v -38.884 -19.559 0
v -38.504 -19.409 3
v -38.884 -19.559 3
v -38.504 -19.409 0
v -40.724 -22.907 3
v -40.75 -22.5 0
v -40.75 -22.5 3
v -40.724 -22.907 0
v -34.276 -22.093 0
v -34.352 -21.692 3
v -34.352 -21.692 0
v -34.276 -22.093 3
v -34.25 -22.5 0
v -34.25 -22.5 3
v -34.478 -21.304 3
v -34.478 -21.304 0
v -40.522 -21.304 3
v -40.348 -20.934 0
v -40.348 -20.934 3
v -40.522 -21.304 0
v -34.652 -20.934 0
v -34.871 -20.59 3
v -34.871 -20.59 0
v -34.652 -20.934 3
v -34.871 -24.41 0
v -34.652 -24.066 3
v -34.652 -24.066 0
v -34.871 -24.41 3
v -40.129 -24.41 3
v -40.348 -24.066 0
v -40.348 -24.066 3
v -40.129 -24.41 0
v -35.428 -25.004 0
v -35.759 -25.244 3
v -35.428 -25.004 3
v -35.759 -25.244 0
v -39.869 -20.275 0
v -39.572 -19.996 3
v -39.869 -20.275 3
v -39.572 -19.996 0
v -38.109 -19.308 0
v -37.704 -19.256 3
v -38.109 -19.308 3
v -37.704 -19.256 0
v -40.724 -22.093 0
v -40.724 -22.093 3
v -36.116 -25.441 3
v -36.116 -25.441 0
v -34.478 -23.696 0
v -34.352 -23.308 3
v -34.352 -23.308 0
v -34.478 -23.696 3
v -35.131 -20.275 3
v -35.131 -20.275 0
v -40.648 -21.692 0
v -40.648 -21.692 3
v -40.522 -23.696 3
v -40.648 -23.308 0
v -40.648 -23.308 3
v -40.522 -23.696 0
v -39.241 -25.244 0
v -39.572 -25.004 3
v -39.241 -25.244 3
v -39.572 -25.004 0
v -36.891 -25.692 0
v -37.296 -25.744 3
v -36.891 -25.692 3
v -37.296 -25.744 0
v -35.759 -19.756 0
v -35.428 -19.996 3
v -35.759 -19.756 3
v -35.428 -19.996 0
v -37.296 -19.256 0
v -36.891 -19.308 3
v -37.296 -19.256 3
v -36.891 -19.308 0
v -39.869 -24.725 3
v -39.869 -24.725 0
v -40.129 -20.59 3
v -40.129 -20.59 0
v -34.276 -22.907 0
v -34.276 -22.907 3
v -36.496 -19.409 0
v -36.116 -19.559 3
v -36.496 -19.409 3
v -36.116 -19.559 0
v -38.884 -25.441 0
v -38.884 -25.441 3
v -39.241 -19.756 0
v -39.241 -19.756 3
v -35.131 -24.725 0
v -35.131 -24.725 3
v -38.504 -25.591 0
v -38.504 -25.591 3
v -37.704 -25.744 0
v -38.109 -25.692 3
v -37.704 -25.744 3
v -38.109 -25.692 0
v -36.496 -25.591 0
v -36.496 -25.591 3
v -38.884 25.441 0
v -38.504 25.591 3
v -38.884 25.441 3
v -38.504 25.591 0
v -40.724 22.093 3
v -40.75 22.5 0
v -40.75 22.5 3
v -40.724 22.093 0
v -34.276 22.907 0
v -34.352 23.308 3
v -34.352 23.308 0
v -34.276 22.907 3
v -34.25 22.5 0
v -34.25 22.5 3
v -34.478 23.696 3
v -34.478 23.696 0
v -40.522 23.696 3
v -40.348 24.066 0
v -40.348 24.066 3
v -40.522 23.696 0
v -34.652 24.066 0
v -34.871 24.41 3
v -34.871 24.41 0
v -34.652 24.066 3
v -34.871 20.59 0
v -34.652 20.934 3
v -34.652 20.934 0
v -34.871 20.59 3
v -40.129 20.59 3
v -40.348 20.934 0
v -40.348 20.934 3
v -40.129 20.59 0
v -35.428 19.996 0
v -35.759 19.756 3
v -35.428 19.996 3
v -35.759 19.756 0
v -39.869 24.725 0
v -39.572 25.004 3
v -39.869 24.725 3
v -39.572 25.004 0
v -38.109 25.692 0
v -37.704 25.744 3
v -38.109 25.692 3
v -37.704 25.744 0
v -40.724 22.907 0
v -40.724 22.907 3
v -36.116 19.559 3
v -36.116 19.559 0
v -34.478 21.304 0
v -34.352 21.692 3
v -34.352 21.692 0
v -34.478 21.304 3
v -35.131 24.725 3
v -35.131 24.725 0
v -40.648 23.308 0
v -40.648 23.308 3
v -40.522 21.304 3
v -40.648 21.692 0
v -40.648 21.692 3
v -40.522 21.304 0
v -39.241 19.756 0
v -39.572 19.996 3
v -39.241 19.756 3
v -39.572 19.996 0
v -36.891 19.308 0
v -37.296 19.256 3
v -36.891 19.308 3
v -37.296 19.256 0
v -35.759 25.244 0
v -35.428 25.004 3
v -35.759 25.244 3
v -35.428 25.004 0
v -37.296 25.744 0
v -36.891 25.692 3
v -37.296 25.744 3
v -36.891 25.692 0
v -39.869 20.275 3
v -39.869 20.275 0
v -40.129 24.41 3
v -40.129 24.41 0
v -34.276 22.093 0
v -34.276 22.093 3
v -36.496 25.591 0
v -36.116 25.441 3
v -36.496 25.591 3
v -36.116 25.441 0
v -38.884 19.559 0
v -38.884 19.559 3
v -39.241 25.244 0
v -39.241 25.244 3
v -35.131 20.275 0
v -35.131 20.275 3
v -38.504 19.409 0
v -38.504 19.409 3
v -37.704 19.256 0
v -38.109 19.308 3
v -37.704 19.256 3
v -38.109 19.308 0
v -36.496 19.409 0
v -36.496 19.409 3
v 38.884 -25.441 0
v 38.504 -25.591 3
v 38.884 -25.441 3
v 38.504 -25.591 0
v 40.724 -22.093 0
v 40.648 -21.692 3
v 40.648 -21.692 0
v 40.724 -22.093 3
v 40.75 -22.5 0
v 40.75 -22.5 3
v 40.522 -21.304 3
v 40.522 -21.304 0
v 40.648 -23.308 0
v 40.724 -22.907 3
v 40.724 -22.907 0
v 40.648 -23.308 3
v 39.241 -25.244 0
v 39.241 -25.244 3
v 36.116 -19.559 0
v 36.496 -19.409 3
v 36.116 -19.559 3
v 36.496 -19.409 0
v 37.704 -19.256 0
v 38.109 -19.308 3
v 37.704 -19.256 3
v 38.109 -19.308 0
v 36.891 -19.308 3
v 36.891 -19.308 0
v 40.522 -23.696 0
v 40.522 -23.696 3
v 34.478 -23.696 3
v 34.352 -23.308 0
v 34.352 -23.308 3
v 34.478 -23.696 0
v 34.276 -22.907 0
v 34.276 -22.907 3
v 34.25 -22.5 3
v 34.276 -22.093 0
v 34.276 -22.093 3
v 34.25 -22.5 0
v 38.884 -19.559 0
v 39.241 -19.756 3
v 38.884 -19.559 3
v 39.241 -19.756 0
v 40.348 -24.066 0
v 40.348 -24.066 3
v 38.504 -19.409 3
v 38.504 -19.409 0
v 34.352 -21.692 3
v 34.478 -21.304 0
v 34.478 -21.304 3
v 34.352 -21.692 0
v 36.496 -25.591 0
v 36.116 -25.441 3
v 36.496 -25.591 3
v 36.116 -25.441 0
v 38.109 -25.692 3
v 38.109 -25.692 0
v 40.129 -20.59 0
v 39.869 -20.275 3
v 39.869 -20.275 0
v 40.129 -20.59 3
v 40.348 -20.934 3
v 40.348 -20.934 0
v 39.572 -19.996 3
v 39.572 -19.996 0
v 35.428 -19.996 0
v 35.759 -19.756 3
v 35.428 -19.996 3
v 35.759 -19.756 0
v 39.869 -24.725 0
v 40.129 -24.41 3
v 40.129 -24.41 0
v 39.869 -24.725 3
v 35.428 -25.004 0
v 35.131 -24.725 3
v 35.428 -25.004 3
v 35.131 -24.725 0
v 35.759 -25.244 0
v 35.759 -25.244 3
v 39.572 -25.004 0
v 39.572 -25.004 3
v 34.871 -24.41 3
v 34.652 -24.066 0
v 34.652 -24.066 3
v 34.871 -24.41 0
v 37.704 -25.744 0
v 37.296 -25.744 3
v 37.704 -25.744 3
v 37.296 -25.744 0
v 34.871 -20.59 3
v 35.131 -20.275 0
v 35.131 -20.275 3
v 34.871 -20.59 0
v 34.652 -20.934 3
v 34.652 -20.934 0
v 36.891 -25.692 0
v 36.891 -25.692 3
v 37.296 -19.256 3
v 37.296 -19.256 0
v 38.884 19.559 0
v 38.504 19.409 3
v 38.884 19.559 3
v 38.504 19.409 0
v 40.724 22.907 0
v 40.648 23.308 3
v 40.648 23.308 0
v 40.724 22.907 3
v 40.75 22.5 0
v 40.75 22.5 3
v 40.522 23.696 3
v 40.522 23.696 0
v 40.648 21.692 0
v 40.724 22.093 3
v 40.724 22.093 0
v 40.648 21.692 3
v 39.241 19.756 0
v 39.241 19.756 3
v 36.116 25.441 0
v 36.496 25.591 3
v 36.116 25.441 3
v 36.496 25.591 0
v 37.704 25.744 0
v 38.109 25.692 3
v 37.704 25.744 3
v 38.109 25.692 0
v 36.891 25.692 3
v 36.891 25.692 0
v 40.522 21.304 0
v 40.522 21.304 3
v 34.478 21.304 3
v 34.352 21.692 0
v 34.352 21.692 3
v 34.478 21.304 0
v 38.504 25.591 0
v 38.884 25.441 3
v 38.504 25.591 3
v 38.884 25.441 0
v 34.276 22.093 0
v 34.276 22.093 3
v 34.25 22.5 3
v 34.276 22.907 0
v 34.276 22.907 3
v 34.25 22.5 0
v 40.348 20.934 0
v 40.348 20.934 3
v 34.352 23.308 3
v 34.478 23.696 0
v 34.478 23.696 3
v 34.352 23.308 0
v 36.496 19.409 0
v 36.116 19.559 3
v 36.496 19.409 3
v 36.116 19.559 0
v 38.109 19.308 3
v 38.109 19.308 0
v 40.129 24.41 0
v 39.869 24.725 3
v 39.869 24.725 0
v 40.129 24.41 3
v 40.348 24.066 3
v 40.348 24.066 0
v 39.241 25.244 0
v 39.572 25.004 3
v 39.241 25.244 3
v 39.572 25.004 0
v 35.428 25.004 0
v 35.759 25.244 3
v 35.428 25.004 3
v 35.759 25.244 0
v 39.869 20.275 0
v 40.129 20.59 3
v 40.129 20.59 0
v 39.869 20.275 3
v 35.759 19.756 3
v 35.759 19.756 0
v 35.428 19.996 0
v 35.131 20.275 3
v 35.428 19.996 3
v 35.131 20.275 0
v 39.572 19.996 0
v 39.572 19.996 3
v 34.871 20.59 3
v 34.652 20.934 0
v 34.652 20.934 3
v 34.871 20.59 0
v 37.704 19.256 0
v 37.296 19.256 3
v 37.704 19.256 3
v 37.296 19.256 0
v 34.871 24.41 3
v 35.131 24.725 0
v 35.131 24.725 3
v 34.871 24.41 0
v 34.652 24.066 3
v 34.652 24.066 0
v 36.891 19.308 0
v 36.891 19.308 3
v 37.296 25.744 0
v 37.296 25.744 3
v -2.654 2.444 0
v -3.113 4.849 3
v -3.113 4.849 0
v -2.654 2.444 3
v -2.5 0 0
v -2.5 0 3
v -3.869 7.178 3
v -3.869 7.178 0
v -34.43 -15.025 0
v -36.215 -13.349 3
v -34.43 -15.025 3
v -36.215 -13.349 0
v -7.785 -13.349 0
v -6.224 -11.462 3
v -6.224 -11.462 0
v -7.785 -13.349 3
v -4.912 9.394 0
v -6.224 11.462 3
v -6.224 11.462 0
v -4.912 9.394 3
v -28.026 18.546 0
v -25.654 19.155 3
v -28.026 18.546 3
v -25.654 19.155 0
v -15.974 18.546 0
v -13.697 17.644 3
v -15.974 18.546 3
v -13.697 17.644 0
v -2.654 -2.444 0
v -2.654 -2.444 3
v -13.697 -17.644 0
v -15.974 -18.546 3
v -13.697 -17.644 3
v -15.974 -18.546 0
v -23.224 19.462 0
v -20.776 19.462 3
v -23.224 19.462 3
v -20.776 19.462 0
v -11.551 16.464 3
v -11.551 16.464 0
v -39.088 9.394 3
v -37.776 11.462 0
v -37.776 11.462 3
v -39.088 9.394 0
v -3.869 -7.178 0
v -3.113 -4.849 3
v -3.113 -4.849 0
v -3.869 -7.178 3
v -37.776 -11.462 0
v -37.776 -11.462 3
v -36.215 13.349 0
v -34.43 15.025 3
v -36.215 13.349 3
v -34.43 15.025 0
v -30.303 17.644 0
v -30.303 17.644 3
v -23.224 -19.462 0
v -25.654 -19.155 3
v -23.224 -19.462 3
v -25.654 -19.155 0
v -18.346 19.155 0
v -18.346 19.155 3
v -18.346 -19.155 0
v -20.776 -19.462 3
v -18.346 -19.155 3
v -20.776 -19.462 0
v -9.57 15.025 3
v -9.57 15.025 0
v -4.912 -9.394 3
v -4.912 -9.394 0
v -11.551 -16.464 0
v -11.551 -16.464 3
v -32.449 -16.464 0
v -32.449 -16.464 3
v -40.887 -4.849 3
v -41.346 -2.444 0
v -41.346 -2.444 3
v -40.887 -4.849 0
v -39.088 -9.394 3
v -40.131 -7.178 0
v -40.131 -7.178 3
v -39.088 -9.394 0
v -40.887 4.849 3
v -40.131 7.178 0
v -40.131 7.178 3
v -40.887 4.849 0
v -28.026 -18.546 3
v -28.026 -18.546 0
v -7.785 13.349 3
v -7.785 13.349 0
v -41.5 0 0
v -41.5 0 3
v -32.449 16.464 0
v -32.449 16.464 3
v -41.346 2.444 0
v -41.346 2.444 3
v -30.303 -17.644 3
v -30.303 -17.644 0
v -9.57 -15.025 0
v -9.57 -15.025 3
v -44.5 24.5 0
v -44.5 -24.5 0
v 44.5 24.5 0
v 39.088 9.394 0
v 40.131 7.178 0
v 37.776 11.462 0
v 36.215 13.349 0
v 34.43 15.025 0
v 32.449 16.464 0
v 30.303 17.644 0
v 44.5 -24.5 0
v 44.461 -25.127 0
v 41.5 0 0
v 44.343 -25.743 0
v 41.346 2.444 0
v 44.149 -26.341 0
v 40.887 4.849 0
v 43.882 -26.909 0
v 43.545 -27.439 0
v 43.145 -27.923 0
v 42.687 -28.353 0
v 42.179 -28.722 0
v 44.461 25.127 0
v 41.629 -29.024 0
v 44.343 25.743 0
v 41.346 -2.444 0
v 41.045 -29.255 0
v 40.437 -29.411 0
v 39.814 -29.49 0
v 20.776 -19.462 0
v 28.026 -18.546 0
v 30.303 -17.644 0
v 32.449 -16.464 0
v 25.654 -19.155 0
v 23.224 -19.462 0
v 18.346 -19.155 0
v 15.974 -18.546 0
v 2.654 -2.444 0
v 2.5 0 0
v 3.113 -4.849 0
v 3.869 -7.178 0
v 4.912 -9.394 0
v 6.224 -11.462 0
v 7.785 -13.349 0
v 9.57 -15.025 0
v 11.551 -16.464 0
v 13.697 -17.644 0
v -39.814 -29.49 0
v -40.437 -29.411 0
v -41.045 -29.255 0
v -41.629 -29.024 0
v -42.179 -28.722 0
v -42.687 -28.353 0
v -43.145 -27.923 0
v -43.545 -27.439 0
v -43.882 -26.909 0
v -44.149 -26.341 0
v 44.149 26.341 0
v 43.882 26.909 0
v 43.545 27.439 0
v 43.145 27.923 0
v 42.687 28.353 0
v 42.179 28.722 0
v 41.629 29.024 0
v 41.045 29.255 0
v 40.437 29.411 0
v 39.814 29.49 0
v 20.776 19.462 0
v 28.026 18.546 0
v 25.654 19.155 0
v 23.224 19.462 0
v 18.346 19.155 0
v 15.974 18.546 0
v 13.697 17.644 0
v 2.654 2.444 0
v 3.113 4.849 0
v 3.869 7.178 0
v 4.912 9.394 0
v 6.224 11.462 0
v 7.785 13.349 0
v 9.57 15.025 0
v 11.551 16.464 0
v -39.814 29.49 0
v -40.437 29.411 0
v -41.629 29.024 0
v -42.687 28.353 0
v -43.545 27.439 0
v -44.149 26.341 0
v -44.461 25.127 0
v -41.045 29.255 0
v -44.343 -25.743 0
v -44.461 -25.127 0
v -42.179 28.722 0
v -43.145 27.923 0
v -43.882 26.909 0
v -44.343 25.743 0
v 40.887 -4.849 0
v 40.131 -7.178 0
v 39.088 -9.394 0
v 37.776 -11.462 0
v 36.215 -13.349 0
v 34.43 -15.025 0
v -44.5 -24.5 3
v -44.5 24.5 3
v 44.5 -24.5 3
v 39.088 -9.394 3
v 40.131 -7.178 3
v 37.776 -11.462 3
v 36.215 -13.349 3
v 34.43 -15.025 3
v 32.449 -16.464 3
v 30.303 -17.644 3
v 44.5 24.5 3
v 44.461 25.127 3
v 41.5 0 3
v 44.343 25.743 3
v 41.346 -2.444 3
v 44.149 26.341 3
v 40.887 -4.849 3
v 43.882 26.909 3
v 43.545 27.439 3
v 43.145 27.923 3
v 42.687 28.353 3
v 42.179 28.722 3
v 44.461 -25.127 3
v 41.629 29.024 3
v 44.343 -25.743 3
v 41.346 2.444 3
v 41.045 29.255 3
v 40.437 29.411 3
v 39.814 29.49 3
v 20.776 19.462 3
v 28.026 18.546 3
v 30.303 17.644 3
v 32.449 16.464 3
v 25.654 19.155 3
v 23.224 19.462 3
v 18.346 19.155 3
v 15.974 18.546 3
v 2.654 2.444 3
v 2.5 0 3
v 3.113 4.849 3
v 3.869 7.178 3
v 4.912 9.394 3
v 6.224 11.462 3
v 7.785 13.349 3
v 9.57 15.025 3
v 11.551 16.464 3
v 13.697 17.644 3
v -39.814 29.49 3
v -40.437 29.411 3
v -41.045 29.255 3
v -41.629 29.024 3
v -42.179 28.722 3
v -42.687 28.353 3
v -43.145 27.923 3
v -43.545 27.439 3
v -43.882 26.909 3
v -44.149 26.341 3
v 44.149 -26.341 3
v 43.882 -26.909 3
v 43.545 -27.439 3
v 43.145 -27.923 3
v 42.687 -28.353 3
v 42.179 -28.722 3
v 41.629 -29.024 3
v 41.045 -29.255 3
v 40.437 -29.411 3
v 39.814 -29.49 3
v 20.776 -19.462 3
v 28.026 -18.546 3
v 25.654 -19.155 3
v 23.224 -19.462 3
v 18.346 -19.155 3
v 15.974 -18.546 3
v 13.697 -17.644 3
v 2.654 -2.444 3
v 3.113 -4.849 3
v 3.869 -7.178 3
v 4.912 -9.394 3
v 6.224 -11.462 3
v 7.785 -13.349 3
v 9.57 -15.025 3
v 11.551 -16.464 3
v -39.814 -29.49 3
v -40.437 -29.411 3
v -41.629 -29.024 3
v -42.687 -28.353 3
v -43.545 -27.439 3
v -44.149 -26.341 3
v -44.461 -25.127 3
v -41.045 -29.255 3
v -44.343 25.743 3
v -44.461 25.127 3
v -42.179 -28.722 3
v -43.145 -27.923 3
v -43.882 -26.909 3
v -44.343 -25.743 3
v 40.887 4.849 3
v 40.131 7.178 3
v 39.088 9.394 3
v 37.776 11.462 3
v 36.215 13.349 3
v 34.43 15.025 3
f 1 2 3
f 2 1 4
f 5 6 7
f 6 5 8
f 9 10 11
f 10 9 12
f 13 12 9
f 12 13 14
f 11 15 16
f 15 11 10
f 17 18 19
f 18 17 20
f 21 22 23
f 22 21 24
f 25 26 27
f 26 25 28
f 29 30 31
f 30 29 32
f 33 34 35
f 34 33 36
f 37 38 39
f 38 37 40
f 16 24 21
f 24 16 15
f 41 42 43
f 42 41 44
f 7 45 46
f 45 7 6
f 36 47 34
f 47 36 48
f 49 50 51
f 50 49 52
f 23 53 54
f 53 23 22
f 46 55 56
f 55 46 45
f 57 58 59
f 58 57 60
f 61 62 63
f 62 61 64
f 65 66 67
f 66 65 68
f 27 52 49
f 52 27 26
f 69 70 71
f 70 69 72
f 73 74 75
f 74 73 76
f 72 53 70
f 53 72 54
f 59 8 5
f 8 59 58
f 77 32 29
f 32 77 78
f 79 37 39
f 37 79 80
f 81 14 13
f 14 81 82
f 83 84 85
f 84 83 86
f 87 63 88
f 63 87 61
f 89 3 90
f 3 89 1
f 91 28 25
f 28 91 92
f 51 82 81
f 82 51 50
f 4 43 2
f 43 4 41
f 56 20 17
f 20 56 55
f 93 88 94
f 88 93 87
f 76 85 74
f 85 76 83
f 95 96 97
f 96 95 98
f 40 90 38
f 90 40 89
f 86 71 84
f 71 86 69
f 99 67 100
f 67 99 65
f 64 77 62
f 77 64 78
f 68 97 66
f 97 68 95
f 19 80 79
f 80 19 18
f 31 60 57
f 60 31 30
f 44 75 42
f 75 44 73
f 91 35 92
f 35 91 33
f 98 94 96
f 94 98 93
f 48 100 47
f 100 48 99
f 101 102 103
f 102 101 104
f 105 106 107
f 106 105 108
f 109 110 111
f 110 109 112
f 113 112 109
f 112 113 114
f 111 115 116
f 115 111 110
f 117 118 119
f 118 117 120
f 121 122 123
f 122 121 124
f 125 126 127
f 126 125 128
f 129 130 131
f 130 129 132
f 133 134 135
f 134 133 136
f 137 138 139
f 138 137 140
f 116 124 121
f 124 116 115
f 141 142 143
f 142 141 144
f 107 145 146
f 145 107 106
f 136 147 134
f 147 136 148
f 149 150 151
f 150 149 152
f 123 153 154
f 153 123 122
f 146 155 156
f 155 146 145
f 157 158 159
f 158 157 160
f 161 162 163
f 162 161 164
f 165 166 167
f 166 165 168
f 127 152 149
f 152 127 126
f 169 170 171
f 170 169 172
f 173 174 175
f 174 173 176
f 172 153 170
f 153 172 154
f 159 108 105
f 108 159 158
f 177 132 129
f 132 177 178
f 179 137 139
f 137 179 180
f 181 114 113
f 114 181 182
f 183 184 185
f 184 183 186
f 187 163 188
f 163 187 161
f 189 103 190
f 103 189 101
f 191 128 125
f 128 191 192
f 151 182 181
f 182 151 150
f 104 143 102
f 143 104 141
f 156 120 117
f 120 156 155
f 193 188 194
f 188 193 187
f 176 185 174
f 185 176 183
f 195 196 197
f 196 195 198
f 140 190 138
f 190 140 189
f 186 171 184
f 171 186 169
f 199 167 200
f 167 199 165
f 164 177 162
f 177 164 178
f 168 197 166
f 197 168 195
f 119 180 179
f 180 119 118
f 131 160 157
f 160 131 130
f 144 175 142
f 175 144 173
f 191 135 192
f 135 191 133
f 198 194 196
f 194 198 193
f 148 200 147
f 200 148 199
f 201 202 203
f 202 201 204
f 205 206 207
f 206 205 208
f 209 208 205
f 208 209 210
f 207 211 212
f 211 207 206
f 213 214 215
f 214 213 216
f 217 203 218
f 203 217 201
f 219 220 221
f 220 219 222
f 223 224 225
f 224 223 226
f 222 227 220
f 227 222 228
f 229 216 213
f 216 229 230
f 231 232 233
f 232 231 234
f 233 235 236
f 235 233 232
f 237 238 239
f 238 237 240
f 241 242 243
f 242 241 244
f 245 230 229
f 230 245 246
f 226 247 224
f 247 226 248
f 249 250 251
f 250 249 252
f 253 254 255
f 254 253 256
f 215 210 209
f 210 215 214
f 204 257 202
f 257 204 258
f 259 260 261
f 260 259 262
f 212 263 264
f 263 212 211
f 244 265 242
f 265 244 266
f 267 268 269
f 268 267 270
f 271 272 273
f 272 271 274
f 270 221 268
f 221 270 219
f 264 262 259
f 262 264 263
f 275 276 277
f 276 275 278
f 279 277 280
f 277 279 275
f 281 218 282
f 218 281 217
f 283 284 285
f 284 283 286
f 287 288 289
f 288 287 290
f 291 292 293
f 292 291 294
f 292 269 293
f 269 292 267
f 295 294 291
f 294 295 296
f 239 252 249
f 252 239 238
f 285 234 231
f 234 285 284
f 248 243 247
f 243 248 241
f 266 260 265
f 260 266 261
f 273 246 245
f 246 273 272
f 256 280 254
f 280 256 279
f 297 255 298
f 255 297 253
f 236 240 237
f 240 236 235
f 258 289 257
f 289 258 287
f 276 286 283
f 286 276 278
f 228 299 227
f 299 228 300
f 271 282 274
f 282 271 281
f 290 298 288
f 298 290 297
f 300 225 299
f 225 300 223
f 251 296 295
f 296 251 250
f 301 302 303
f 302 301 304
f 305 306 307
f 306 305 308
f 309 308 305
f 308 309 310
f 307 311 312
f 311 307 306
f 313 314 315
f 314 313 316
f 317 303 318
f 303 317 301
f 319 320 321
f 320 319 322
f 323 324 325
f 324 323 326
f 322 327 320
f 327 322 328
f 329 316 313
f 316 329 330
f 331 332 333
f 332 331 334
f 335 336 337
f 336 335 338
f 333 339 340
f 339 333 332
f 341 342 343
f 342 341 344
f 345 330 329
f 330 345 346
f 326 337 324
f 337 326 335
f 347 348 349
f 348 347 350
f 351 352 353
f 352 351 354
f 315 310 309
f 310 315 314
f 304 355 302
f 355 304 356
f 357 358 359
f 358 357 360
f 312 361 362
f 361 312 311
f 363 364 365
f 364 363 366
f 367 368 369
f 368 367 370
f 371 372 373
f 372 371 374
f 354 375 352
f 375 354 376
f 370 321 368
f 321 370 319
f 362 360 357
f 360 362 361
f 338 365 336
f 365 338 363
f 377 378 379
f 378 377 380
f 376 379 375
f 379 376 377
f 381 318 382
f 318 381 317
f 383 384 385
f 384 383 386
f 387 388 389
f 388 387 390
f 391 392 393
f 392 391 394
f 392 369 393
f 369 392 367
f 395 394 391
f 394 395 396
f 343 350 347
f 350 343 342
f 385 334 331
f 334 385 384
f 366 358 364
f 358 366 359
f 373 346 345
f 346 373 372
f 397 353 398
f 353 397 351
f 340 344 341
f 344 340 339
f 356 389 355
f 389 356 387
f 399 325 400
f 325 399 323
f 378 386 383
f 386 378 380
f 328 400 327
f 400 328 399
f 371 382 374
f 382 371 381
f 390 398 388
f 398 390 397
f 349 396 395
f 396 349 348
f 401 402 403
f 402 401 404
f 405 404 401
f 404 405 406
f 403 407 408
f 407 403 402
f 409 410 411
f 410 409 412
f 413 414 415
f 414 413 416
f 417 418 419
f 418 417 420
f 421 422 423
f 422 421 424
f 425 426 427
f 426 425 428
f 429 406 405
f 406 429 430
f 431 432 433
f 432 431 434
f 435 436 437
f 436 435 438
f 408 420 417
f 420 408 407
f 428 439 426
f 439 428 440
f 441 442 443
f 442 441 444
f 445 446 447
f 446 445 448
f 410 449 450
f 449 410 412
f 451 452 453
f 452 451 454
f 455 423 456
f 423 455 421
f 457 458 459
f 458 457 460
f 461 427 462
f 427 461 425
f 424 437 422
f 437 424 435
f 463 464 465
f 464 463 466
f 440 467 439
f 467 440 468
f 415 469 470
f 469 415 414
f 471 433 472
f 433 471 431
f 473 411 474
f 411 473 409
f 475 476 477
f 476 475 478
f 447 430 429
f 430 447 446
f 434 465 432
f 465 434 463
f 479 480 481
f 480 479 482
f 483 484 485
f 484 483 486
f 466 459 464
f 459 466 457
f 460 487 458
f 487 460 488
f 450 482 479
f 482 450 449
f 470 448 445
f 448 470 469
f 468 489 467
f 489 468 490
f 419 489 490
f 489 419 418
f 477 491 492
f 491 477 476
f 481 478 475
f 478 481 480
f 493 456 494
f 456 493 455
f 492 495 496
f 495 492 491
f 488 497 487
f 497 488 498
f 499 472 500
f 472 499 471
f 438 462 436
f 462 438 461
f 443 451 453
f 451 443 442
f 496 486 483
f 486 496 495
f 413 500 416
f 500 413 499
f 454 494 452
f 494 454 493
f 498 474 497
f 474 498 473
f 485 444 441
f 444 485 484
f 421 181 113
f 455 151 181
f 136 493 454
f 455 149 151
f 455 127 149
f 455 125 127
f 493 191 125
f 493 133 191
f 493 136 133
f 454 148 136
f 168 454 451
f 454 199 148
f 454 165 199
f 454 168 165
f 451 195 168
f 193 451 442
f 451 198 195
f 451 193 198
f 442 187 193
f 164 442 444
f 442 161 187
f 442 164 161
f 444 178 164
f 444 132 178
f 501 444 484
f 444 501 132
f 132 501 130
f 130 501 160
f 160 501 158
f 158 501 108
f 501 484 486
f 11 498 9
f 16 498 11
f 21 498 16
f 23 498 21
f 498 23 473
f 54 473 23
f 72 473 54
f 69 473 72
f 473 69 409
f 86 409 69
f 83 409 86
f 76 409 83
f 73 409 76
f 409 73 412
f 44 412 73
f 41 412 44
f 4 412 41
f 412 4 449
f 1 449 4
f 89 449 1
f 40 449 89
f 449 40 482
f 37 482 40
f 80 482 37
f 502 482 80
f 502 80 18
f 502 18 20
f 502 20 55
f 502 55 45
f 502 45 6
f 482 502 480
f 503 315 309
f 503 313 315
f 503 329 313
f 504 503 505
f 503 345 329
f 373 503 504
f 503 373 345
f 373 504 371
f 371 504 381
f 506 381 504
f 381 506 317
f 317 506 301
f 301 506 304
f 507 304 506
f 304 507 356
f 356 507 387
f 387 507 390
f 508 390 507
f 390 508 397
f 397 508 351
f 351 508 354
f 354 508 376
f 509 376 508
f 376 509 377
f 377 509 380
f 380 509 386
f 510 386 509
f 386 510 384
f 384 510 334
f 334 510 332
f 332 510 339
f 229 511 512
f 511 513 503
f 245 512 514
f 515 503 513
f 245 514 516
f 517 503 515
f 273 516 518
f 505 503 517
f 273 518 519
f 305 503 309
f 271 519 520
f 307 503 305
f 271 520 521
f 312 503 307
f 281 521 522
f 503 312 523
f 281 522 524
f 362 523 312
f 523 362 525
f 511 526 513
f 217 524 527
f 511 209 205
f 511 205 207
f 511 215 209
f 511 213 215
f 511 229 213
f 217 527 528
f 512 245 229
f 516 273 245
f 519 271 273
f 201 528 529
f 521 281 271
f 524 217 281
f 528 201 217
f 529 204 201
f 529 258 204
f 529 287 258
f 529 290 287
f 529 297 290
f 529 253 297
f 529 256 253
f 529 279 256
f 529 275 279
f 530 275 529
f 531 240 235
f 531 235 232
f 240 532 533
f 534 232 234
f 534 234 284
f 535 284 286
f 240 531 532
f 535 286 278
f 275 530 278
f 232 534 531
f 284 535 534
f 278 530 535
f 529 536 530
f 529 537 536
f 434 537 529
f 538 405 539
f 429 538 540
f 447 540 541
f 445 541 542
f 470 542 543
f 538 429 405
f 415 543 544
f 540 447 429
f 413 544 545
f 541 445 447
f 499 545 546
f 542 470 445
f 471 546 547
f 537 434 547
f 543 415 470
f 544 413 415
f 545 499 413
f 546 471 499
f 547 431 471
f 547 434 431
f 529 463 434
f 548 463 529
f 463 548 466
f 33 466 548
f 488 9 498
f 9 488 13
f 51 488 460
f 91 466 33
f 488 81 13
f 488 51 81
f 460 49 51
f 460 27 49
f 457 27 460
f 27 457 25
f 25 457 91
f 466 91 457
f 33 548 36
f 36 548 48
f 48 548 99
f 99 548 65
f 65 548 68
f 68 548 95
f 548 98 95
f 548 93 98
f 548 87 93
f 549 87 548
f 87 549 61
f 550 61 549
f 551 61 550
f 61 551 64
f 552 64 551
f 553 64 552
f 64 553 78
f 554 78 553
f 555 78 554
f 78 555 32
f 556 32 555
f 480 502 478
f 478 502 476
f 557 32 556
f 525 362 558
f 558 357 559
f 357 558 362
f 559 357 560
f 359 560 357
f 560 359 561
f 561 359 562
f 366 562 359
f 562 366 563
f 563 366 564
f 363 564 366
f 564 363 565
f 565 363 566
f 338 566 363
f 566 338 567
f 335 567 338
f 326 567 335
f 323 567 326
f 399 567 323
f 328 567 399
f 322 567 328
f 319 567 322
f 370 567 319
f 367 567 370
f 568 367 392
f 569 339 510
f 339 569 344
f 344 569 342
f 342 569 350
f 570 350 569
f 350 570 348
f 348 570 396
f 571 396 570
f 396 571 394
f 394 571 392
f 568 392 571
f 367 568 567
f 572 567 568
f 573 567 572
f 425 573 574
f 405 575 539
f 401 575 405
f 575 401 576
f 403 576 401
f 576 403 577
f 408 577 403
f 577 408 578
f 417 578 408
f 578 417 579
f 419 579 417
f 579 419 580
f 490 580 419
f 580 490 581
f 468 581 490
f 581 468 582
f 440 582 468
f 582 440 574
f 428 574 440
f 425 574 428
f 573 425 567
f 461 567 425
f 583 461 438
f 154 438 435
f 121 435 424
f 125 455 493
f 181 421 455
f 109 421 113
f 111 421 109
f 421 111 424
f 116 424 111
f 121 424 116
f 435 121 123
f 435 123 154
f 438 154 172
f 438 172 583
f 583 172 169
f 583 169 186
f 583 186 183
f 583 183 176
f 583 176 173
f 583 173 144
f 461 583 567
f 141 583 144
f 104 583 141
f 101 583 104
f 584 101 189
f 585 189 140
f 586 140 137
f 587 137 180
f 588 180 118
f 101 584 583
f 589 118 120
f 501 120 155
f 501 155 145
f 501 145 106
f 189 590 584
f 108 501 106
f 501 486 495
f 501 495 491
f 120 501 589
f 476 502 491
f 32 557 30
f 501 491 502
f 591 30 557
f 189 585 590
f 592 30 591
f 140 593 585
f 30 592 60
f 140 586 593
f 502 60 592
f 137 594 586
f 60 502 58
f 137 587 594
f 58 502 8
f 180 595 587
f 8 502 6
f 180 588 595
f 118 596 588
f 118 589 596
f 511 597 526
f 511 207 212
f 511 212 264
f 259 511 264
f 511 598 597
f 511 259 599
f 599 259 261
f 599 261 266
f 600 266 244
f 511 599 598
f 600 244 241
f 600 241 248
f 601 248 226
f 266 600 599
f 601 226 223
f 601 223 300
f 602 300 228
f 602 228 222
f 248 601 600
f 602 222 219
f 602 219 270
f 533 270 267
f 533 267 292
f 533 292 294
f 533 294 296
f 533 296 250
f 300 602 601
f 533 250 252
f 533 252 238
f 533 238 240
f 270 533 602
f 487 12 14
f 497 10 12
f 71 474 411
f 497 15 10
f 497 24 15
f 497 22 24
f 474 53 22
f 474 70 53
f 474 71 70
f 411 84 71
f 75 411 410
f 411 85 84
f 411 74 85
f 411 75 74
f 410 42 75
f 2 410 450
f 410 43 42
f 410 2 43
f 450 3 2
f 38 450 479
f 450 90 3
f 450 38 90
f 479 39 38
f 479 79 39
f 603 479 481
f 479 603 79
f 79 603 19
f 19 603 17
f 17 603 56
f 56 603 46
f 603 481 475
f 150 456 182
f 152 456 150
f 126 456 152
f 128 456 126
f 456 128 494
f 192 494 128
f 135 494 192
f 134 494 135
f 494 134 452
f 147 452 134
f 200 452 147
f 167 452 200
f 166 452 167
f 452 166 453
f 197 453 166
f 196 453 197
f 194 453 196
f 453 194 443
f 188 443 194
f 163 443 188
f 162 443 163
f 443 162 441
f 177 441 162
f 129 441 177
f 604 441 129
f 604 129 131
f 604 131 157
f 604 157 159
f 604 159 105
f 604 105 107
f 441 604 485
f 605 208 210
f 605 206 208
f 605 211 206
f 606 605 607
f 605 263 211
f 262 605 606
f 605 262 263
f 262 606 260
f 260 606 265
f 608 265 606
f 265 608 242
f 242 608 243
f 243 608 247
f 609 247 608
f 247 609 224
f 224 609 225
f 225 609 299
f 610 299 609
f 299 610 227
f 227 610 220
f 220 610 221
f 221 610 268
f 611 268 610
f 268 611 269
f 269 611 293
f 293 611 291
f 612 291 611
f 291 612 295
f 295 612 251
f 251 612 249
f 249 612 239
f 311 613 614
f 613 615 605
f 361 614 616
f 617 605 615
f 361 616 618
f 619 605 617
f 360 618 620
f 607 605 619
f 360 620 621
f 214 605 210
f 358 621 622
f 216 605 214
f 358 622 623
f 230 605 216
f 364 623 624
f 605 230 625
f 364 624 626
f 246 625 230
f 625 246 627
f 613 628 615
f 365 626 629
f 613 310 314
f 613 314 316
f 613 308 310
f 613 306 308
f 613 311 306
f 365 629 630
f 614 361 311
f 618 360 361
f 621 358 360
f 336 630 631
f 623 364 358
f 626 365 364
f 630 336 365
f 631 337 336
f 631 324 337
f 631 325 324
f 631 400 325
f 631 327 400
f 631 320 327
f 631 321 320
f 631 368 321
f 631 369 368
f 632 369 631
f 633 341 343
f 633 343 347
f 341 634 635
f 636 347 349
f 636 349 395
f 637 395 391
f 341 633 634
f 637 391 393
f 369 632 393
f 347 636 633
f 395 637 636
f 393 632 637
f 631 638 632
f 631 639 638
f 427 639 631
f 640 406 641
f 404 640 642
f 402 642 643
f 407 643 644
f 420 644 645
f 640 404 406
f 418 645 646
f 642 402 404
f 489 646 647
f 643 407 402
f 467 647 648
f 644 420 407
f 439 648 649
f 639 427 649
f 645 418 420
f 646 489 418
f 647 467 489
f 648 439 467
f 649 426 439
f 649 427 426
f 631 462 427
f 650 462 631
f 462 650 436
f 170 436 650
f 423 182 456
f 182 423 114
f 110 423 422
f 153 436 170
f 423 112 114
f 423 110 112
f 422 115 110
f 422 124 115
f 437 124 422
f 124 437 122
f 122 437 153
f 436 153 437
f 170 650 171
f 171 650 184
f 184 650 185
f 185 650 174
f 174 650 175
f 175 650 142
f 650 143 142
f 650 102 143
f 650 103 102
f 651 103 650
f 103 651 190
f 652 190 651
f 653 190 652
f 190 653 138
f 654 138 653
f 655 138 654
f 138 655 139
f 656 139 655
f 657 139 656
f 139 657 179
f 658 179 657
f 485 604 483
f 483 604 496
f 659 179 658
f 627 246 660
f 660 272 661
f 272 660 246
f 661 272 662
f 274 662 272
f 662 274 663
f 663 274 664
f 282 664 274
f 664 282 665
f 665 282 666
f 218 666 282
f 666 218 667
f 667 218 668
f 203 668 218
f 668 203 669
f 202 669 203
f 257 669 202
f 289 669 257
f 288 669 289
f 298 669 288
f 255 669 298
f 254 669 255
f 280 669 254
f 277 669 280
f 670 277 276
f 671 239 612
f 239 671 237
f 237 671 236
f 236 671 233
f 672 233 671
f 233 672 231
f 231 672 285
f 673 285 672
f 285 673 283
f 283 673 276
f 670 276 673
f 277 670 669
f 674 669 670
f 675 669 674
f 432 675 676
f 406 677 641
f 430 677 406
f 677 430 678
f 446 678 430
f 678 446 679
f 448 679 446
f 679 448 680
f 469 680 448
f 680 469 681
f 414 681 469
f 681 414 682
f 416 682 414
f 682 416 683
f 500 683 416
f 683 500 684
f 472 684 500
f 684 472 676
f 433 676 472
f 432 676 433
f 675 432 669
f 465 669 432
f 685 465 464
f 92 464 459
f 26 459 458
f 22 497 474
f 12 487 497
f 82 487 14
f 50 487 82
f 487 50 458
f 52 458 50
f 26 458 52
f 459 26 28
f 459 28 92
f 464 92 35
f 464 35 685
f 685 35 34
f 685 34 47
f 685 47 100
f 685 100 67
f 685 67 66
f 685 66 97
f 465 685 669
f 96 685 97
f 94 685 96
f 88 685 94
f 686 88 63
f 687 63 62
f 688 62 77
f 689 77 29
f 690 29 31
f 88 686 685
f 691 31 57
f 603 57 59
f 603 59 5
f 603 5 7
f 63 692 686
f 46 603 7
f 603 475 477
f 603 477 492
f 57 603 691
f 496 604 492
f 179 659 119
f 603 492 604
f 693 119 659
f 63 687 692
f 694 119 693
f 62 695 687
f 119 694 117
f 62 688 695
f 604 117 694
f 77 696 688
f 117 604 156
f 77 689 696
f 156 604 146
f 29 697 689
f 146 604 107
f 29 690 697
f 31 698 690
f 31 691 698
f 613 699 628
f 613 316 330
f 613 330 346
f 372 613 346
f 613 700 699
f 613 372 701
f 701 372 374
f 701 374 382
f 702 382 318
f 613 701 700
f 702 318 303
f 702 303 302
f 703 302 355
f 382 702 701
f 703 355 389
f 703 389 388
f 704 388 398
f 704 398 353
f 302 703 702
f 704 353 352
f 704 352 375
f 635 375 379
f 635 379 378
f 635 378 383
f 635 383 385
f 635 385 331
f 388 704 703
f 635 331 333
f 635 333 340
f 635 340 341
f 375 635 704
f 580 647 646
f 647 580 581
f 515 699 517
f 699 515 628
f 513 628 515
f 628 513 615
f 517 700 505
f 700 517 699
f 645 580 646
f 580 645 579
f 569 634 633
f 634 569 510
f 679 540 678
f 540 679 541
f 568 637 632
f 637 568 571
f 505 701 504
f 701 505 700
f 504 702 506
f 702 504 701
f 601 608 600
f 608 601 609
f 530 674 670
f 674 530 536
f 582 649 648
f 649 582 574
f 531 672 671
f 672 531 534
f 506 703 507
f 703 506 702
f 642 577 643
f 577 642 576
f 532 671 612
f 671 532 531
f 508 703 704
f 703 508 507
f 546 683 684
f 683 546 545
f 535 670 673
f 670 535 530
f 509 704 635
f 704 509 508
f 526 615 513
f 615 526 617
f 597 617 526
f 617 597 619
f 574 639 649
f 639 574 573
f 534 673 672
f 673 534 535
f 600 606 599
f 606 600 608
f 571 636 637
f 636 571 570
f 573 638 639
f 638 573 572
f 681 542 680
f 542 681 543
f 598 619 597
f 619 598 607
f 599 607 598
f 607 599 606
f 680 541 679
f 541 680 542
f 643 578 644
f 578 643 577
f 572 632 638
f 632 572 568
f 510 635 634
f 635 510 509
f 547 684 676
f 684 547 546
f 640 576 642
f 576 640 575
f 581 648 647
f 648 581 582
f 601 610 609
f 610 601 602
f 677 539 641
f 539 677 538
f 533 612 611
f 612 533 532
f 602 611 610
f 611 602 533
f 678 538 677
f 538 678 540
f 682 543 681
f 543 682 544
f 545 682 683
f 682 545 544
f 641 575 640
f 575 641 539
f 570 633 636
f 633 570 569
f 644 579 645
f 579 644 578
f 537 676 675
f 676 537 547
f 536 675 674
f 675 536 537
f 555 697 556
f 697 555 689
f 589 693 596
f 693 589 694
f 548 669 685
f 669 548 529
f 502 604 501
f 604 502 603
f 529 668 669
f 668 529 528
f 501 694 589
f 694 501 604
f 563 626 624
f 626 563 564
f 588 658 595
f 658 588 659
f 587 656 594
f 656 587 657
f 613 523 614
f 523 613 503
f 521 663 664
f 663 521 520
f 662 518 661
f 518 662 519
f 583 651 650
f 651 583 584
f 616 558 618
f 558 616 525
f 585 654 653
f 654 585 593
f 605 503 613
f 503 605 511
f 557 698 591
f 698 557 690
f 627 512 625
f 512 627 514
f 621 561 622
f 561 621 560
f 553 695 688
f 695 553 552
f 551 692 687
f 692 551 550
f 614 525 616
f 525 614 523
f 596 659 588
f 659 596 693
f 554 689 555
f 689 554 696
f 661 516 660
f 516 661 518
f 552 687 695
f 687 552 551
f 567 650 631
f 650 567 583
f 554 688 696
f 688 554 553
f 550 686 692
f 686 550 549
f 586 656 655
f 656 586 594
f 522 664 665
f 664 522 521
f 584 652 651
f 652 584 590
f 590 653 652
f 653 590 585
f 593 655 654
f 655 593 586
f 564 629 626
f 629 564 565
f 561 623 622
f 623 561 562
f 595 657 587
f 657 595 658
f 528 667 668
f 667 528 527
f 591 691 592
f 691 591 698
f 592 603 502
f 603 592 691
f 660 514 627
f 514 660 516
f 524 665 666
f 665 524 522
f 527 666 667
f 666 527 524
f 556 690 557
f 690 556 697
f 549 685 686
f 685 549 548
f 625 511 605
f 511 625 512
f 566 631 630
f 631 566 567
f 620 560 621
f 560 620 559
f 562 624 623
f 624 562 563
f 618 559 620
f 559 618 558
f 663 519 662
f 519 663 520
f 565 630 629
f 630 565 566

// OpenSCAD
$fn = 50;


difference() {
	union() {
		hull() {
			translate(v = [-39.5000000000, 24.5000000000, 0]) {
				cylinder(h = 3, r = 5);
			}
			translate(v = [39.5000000000, 24.5000000000, 0]) {
				cylinder(h = 3, r = 5);
			}
			translate(v = [-39.5000000000, -24.5000000000, 0]) {
				cylinder(h = 3, r = 5);
			}
			translate(v = [39.5000000000, -24.5000000000, 0]) {
				cylinder(h = 3, r = 5);
			}
		}
	}
	union() {
		#translate(v = [-37.5000000000, -22.5000000000, -100.0000000000]) {
			cylinder(h = 200, r = 3.2500000000);
		}
		#translate(v = [-37.5000000000, 22.5000000000, -100.0000000000]) {
			cylinder(h = 200, r = 3.2500000000);
		}
		#translate(v = [37.5000000000, -22.5000000000, -100.0000000000]) {
			cylinder(h = 200, r = 3.2500000000);
		}
		#translate(v = [37.5000000000, 22.5000000000, -100.0000000000]) {
			cylinder(h = 200, r = 3.2500000000);
		}
		#translate(v = [-22.0000000000, 0, 0]) {
			cylinder(h = 3, r = 19.5000000000);
		}
		#translate(v = [22.0000000000, 0, 0]) {
			cylinder(h = 3, r = 19.5000000000);
		}
	}
}
